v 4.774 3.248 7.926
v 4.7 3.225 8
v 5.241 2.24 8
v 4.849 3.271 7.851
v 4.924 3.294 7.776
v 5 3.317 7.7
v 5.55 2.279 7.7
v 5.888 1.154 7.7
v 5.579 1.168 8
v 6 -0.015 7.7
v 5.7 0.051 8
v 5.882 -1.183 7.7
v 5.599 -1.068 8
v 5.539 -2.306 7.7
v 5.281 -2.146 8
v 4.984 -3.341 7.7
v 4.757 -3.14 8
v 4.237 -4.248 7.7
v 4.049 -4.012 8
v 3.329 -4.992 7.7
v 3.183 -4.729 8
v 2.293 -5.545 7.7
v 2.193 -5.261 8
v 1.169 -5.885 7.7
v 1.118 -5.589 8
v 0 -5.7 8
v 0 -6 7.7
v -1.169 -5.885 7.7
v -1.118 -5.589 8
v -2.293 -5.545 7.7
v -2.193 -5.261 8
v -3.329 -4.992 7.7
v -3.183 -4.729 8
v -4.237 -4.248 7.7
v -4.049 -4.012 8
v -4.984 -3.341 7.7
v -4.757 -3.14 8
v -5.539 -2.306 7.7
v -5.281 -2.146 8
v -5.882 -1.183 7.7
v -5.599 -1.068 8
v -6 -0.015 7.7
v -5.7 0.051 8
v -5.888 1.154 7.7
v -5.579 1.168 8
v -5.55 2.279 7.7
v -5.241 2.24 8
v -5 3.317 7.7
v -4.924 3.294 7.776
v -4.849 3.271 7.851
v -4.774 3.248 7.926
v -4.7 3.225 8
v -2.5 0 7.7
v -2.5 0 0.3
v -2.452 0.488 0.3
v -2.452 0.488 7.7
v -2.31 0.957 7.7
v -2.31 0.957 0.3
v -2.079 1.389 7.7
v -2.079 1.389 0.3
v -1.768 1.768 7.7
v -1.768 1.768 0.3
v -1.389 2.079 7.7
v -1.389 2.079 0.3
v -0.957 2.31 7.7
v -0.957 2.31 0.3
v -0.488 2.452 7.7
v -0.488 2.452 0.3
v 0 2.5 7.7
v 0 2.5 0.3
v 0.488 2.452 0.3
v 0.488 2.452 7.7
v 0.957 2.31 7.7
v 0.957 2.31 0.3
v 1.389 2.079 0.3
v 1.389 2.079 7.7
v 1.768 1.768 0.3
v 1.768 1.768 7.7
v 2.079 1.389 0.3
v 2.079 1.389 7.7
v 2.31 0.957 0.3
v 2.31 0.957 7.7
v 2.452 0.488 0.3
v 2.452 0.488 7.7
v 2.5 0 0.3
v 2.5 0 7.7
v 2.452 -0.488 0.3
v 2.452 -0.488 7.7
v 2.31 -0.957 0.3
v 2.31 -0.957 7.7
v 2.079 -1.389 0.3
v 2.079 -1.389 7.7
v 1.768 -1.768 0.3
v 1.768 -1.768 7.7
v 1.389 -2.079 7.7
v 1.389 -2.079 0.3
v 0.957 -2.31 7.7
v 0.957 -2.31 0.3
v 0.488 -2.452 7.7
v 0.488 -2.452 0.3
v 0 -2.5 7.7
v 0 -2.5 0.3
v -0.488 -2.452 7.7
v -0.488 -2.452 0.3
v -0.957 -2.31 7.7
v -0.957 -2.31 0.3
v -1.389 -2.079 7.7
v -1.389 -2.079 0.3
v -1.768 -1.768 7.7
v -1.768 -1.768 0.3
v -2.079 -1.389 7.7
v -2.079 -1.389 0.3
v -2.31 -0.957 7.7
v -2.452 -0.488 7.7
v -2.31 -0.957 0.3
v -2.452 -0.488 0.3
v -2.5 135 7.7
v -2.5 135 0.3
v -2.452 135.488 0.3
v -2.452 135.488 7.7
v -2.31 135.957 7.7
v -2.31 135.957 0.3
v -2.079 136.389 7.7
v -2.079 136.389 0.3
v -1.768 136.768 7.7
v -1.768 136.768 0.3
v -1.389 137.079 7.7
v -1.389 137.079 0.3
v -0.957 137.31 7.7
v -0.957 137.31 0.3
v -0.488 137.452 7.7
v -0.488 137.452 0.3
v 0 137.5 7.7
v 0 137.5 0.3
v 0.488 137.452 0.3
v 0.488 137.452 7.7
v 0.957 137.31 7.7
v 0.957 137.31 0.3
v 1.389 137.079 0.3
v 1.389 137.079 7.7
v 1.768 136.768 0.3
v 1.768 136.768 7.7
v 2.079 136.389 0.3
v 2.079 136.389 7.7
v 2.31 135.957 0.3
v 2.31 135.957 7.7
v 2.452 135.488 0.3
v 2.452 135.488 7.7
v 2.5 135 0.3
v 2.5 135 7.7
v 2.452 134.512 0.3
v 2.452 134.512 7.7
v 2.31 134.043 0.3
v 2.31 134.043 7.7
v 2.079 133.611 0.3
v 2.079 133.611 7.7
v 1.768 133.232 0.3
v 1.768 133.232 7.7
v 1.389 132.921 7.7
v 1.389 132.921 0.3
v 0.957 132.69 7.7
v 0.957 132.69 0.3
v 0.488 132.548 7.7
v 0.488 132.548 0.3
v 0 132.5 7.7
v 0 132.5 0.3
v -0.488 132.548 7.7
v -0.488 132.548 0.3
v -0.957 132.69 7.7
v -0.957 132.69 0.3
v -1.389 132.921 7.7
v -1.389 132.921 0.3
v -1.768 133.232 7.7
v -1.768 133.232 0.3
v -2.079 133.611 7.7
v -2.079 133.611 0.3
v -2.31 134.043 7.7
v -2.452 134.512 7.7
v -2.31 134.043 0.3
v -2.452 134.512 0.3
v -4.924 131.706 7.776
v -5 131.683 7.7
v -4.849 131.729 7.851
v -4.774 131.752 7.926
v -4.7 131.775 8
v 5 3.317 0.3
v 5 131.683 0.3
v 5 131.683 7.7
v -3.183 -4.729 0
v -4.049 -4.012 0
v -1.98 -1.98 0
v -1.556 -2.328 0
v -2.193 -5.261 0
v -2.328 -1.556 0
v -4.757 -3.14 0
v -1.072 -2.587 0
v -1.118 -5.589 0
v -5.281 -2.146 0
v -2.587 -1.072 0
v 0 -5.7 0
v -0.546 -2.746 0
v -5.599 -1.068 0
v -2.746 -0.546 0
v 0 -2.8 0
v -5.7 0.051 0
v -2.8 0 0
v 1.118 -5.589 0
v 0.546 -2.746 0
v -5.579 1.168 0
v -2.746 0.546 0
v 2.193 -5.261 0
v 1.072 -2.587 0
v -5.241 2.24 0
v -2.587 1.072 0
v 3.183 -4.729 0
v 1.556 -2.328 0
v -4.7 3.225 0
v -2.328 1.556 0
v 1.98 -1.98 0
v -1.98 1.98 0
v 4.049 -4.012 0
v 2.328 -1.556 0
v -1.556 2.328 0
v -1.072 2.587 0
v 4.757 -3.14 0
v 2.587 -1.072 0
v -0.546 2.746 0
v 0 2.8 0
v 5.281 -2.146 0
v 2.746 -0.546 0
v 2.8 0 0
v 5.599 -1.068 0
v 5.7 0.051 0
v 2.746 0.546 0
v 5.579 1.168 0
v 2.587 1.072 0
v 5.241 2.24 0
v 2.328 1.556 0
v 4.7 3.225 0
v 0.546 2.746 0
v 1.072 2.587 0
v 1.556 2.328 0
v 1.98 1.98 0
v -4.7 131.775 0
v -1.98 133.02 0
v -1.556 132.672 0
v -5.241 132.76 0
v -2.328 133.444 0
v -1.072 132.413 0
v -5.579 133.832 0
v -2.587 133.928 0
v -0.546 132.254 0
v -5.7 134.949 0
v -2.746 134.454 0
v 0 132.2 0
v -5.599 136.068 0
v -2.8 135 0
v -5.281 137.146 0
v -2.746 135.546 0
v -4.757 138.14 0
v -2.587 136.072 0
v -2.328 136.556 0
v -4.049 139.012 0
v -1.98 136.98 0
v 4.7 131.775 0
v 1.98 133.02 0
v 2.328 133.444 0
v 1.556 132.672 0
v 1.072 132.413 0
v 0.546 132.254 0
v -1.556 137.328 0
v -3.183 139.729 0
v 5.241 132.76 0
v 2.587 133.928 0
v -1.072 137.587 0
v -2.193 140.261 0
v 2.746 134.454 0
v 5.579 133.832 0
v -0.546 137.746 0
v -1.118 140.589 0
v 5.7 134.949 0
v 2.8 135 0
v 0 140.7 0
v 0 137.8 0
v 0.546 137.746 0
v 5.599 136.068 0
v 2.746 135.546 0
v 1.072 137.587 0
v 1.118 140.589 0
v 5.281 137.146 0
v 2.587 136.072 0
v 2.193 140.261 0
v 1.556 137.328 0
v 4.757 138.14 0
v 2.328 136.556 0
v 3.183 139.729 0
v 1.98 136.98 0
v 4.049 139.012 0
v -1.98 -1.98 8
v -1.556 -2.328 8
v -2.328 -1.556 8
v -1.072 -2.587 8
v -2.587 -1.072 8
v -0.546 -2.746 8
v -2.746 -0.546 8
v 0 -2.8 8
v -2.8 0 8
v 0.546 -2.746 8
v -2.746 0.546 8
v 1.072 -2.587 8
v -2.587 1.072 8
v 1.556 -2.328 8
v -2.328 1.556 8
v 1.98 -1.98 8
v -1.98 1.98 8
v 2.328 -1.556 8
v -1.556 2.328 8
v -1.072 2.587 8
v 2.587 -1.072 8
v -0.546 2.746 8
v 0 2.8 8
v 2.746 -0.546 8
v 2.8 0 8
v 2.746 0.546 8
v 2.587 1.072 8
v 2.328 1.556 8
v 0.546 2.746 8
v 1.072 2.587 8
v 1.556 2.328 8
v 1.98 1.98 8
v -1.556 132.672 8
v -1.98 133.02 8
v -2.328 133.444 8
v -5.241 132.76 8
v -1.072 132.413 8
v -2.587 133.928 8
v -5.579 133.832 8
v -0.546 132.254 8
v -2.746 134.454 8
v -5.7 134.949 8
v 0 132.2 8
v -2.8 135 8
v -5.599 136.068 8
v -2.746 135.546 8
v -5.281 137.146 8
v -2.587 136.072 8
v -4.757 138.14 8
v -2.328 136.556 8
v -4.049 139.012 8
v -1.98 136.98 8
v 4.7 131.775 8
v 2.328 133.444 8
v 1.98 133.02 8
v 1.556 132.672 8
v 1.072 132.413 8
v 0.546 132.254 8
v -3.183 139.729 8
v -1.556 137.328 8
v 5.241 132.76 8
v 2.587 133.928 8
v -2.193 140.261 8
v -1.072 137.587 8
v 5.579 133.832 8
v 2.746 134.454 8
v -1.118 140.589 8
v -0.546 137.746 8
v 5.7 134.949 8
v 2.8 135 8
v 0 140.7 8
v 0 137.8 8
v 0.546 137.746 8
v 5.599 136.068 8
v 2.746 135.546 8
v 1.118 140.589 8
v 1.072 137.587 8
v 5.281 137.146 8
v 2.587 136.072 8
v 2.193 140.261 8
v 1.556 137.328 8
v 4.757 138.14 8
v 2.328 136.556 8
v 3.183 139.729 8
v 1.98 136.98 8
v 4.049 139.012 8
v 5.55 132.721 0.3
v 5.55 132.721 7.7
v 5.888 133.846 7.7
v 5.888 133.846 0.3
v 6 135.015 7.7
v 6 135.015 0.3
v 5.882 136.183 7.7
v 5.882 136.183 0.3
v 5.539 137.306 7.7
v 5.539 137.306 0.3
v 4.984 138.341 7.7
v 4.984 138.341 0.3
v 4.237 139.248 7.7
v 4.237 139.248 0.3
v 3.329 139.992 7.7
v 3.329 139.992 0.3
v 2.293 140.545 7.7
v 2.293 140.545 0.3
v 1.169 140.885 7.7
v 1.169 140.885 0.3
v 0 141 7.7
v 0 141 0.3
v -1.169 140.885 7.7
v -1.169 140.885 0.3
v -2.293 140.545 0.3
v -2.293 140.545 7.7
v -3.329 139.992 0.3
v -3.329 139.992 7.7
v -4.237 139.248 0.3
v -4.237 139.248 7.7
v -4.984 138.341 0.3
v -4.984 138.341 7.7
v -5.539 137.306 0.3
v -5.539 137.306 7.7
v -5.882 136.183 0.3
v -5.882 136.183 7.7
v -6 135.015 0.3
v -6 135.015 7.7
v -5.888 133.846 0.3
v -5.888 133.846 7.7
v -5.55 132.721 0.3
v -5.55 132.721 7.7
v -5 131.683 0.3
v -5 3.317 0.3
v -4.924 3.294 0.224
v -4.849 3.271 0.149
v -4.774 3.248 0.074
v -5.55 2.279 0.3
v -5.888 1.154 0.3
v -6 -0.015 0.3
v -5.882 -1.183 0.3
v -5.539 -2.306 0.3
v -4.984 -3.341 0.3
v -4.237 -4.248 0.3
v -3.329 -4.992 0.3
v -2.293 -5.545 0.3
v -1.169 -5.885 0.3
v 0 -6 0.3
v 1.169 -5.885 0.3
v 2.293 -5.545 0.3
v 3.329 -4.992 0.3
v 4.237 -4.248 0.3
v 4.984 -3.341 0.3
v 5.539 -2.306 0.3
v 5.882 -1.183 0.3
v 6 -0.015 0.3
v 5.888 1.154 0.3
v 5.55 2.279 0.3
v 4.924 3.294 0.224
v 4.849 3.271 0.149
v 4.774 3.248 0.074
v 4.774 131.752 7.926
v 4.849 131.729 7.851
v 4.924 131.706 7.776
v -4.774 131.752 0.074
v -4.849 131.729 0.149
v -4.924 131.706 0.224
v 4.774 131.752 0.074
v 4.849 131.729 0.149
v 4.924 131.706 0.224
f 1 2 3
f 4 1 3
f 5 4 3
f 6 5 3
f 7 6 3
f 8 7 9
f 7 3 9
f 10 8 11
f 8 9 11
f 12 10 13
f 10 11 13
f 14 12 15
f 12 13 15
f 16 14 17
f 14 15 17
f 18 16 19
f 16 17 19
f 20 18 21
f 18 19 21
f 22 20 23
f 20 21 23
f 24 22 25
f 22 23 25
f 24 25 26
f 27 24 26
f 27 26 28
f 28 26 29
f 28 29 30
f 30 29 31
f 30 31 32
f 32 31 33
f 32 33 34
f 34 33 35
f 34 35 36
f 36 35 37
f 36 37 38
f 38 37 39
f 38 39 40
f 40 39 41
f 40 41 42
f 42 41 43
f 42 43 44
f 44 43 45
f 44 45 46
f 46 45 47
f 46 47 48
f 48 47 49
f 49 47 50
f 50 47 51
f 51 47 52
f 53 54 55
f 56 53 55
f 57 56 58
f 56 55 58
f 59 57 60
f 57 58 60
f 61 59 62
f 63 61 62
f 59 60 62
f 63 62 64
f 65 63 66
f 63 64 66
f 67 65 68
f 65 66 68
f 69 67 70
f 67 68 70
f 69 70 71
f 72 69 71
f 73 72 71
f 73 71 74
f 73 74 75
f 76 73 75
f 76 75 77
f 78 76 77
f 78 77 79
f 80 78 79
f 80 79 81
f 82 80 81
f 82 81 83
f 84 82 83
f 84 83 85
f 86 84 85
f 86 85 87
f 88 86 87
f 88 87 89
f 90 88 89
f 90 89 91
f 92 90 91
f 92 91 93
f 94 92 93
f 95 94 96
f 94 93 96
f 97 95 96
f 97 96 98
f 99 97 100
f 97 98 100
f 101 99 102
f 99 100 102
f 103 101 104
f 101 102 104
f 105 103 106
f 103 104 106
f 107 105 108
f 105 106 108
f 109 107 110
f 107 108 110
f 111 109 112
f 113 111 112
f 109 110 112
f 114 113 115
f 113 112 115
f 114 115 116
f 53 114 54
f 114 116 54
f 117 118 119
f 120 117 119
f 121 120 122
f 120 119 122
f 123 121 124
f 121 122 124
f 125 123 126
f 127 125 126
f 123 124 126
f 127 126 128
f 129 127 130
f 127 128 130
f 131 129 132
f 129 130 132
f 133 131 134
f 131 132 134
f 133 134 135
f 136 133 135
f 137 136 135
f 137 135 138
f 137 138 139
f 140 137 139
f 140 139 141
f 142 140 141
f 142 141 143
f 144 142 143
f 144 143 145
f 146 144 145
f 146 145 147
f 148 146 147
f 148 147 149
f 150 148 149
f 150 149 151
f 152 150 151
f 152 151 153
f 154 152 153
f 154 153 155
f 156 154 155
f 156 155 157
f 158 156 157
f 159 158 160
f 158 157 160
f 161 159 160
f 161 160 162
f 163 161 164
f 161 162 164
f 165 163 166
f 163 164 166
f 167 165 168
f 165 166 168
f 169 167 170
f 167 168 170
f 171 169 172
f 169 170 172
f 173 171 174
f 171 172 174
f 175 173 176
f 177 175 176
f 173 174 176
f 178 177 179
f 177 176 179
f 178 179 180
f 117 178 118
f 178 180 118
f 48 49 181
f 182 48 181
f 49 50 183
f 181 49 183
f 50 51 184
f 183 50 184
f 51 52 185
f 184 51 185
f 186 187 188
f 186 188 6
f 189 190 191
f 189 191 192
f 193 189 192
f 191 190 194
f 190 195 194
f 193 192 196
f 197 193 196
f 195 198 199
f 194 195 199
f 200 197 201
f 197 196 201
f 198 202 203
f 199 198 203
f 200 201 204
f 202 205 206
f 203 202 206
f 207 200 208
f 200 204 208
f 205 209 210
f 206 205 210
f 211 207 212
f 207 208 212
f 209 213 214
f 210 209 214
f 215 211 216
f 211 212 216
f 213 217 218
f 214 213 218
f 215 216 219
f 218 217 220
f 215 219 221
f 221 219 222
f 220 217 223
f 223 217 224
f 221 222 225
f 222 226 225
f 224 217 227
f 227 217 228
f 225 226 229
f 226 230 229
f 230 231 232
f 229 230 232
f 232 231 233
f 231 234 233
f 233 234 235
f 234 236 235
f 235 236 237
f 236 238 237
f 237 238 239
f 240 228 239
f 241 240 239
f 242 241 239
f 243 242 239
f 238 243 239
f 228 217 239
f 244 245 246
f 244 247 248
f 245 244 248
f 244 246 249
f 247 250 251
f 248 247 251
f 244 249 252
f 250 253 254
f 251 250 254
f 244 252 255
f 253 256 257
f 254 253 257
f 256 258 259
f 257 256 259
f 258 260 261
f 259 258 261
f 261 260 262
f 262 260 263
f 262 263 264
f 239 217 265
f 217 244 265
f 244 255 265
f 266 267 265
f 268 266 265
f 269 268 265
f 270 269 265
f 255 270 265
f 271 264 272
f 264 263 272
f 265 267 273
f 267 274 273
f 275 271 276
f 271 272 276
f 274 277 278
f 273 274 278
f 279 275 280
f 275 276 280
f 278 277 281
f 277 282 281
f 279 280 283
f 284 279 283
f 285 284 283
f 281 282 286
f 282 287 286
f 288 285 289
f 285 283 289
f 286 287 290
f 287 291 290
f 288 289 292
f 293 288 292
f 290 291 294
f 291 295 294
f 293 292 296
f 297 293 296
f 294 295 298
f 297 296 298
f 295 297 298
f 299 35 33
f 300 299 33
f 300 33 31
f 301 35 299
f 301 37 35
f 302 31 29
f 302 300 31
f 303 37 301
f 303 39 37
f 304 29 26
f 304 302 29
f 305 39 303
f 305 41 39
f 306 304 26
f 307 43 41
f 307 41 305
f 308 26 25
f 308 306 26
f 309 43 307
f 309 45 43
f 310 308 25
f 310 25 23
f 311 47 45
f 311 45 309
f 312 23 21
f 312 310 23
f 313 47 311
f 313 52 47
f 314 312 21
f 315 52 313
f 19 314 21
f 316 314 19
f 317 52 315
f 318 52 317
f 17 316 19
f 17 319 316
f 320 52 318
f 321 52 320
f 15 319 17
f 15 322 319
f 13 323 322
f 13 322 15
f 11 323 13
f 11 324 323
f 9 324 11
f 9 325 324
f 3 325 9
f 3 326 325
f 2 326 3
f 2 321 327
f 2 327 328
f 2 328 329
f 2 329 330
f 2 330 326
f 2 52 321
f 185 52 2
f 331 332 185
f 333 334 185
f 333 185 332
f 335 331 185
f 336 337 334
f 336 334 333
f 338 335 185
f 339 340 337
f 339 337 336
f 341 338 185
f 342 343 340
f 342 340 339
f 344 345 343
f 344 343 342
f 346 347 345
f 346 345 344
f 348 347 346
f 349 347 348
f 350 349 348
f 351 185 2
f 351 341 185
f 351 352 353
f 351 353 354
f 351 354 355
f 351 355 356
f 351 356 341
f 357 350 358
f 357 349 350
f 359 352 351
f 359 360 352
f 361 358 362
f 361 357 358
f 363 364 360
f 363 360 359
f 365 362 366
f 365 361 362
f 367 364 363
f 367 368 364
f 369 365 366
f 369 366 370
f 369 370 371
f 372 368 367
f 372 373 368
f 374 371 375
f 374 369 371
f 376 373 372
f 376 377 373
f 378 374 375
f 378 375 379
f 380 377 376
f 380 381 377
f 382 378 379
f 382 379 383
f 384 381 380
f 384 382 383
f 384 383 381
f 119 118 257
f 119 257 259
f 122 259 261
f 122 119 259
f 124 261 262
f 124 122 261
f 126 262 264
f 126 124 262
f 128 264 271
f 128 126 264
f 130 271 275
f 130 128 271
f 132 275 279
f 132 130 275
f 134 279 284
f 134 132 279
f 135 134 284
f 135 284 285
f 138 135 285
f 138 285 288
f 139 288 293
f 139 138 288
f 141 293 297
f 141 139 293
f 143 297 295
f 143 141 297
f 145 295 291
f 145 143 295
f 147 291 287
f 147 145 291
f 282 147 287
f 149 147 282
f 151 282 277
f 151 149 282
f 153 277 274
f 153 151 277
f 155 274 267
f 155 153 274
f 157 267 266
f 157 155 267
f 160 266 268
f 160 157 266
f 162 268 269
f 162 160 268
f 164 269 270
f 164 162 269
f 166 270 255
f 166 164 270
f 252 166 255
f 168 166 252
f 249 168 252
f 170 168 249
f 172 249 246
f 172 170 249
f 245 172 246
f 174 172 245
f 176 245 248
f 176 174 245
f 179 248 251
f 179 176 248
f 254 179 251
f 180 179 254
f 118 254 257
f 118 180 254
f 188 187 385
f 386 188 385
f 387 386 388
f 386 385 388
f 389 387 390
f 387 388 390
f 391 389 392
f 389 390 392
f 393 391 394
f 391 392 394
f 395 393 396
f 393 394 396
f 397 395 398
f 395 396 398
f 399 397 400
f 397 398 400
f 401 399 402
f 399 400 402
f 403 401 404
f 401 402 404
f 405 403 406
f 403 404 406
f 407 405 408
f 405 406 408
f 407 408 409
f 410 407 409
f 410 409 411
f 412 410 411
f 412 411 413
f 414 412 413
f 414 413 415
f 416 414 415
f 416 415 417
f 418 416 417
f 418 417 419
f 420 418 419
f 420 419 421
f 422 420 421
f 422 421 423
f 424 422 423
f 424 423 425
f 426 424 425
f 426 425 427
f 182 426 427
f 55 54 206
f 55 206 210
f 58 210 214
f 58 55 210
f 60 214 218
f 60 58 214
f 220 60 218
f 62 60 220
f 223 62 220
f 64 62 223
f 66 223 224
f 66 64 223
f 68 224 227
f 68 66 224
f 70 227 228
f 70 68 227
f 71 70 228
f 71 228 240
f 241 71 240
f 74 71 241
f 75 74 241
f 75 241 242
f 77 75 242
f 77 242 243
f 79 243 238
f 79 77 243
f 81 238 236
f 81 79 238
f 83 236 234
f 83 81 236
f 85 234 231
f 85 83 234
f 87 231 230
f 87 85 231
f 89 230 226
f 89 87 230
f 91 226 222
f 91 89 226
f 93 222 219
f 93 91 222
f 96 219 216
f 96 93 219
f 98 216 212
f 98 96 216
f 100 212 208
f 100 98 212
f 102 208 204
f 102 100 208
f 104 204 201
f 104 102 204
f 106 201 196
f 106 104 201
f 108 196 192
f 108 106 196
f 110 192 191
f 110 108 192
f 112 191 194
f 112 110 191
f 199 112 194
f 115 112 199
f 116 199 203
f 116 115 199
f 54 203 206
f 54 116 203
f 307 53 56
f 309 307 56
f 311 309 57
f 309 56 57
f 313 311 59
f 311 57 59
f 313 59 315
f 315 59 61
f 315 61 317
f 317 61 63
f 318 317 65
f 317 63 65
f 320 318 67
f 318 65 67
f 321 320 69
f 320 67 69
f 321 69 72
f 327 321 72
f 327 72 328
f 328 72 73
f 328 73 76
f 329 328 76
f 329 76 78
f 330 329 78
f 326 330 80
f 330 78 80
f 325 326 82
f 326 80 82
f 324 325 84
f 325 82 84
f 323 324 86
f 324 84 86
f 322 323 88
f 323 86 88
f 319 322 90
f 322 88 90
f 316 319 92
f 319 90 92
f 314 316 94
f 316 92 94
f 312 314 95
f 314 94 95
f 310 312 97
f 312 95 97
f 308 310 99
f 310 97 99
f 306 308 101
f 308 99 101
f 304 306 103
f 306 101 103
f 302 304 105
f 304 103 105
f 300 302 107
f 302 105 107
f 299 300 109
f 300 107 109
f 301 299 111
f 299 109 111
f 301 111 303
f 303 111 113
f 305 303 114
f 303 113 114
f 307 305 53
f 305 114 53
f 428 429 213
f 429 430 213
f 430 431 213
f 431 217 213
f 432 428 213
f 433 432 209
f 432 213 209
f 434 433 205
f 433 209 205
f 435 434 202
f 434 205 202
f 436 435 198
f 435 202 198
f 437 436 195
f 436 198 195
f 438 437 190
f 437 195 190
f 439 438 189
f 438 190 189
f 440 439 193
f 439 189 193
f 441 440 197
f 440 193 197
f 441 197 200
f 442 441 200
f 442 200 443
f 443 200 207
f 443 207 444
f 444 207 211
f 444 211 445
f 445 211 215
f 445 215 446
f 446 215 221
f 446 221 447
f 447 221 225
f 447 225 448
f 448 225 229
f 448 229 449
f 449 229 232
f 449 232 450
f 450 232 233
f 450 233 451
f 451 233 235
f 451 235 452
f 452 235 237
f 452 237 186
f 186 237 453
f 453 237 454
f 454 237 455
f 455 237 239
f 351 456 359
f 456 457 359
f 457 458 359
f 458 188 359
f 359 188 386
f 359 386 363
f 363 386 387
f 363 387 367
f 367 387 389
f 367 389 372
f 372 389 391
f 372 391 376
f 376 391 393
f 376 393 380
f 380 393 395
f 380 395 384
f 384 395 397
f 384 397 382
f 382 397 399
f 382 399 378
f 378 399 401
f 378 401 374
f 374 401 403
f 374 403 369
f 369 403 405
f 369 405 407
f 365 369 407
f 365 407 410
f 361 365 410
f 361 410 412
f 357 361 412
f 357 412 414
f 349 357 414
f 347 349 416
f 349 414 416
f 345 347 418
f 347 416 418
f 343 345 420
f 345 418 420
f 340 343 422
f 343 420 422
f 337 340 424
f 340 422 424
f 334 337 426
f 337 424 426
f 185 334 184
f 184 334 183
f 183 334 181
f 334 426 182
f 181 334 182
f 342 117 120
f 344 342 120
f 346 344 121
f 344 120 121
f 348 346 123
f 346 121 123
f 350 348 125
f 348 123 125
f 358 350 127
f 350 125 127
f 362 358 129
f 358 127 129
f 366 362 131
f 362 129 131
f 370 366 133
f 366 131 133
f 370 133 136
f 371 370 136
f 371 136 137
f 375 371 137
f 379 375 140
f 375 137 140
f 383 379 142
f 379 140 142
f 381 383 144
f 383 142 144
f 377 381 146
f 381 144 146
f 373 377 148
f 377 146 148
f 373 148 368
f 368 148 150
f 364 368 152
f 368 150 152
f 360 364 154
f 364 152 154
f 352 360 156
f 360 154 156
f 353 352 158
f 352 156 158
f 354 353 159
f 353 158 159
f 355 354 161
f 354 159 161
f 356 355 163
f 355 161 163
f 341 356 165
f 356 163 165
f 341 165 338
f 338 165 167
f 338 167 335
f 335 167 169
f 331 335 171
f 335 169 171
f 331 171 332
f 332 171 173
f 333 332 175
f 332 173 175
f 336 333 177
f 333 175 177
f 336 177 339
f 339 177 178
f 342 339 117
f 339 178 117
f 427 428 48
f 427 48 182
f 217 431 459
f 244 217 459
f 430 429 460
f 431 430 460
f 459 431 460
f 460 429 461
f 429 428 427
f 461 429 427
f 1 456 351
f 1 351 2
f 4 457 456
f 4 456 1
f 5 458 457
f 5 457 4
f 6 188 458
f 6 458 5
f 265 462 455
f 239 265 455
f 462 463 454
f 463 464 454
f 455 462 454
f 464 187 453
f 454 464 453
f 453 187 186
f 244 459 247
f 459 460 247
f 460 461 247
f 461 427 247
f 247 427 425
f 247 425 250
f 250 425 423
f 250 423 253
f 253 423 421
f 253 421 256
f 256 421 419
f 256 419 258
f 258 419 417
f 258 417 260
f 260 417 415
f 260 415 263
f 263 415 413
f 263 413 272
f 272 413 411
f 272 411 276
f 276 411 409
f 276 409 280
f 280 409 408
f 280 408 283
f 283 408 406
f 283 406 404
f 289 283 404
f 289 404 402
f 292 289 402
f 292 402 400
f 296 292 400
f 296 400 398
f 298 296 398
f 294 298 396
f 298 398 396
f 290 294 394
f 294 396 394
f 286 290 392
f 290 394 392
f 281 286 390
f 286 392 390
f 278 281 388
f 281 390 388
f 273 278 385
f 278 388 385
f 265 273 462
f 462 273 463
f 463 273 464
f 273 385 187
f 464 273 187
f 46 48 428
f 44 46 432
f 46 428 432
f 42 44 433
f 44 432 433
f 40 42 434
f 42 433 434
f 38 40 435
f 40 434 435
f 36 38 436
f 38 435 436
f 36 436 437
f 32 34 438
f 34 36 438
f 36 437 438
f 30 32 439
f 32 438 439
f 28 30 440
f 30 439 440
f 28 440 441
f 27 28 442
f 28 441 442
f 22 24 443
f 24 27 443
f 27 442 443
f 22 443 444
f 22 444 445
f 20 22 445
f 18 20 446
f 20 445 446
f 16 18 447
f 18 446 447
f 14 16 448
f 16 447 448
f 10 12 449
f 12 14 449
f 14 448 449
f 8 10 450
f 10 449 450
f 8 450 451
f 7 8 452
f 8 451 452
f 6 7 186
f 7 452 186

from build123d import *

# Parameters (mm, degrees)
EXTRUDE_1_DEPTH     = 8
SKETCH_2_R          = 6
EXTRUDE_2_DEPTH     = 8
SKETCH_3_R          = 2.5
CUT_EXTRUDE_1_DEPTH = 9
CHAMFER_1_SIZE      = 0.3


with BuildPart() as part:
    # 草图1 → 凸台-拉伸1 (new body)
    with BuildSketch(Plane.XY):
        with BuildLine():
            Line((-5, 0), (-5, 135))
            ThreePointArc((-5, 135), (0, 140), (5, 135))
            Line((5, 135), (5, 0))
            ThreePointArc((5, 0), (0, -5), (-5, 0))
        make_face()
    extrude(amount=EXTRUDE_1_DEPTH)

    # 草图2 → 凸台-拉伸2 (add)
    with BuildSketch(Plane.XY):
        Circle(SKETCH_2_R)
        with Locations((0, 135)):
            Circle(SKETCH_2_R)
    extrude(amount=EXTRUDE_2_DEPTH)

    # 草图3 → 切除-拉伸1 (cut, through all)
    with BuildSketch(Plane(origin=(0, 0, 0), x_dir=(-1, 0, 0), z_dir=(0, 0, -1))):
        with Locations((0, 135)):
            Circle(SKETCH_3_R)
        Circle(SKETCH_3_R)
    extrude(amount=-CUT_EXTRUDE_1_DEPTH, mode=Mode.SUBTRACT)

    # 倒角1
    chamfer_1_edges = [part.edges().sort_by_distance(p)[0] for p in [
        (5, 67.5, 0),
        (5, 67.5, 8),
        (0, -6, 8),
        (0, -6, 0),
        (-5, 67.5, 0),
        (-5, 67.5, 8),
        (0, 141, 0),
        (0, 141, 8),
        (2.5, 135, 8),
        (2.5, 135, 0),
        (2.5, 0, 8),
        (2.5, 0, 0),
    ]]
    chamfer(chamfer_1_edges, length=CHAMFER_1_SIZE)


solid = part.part
